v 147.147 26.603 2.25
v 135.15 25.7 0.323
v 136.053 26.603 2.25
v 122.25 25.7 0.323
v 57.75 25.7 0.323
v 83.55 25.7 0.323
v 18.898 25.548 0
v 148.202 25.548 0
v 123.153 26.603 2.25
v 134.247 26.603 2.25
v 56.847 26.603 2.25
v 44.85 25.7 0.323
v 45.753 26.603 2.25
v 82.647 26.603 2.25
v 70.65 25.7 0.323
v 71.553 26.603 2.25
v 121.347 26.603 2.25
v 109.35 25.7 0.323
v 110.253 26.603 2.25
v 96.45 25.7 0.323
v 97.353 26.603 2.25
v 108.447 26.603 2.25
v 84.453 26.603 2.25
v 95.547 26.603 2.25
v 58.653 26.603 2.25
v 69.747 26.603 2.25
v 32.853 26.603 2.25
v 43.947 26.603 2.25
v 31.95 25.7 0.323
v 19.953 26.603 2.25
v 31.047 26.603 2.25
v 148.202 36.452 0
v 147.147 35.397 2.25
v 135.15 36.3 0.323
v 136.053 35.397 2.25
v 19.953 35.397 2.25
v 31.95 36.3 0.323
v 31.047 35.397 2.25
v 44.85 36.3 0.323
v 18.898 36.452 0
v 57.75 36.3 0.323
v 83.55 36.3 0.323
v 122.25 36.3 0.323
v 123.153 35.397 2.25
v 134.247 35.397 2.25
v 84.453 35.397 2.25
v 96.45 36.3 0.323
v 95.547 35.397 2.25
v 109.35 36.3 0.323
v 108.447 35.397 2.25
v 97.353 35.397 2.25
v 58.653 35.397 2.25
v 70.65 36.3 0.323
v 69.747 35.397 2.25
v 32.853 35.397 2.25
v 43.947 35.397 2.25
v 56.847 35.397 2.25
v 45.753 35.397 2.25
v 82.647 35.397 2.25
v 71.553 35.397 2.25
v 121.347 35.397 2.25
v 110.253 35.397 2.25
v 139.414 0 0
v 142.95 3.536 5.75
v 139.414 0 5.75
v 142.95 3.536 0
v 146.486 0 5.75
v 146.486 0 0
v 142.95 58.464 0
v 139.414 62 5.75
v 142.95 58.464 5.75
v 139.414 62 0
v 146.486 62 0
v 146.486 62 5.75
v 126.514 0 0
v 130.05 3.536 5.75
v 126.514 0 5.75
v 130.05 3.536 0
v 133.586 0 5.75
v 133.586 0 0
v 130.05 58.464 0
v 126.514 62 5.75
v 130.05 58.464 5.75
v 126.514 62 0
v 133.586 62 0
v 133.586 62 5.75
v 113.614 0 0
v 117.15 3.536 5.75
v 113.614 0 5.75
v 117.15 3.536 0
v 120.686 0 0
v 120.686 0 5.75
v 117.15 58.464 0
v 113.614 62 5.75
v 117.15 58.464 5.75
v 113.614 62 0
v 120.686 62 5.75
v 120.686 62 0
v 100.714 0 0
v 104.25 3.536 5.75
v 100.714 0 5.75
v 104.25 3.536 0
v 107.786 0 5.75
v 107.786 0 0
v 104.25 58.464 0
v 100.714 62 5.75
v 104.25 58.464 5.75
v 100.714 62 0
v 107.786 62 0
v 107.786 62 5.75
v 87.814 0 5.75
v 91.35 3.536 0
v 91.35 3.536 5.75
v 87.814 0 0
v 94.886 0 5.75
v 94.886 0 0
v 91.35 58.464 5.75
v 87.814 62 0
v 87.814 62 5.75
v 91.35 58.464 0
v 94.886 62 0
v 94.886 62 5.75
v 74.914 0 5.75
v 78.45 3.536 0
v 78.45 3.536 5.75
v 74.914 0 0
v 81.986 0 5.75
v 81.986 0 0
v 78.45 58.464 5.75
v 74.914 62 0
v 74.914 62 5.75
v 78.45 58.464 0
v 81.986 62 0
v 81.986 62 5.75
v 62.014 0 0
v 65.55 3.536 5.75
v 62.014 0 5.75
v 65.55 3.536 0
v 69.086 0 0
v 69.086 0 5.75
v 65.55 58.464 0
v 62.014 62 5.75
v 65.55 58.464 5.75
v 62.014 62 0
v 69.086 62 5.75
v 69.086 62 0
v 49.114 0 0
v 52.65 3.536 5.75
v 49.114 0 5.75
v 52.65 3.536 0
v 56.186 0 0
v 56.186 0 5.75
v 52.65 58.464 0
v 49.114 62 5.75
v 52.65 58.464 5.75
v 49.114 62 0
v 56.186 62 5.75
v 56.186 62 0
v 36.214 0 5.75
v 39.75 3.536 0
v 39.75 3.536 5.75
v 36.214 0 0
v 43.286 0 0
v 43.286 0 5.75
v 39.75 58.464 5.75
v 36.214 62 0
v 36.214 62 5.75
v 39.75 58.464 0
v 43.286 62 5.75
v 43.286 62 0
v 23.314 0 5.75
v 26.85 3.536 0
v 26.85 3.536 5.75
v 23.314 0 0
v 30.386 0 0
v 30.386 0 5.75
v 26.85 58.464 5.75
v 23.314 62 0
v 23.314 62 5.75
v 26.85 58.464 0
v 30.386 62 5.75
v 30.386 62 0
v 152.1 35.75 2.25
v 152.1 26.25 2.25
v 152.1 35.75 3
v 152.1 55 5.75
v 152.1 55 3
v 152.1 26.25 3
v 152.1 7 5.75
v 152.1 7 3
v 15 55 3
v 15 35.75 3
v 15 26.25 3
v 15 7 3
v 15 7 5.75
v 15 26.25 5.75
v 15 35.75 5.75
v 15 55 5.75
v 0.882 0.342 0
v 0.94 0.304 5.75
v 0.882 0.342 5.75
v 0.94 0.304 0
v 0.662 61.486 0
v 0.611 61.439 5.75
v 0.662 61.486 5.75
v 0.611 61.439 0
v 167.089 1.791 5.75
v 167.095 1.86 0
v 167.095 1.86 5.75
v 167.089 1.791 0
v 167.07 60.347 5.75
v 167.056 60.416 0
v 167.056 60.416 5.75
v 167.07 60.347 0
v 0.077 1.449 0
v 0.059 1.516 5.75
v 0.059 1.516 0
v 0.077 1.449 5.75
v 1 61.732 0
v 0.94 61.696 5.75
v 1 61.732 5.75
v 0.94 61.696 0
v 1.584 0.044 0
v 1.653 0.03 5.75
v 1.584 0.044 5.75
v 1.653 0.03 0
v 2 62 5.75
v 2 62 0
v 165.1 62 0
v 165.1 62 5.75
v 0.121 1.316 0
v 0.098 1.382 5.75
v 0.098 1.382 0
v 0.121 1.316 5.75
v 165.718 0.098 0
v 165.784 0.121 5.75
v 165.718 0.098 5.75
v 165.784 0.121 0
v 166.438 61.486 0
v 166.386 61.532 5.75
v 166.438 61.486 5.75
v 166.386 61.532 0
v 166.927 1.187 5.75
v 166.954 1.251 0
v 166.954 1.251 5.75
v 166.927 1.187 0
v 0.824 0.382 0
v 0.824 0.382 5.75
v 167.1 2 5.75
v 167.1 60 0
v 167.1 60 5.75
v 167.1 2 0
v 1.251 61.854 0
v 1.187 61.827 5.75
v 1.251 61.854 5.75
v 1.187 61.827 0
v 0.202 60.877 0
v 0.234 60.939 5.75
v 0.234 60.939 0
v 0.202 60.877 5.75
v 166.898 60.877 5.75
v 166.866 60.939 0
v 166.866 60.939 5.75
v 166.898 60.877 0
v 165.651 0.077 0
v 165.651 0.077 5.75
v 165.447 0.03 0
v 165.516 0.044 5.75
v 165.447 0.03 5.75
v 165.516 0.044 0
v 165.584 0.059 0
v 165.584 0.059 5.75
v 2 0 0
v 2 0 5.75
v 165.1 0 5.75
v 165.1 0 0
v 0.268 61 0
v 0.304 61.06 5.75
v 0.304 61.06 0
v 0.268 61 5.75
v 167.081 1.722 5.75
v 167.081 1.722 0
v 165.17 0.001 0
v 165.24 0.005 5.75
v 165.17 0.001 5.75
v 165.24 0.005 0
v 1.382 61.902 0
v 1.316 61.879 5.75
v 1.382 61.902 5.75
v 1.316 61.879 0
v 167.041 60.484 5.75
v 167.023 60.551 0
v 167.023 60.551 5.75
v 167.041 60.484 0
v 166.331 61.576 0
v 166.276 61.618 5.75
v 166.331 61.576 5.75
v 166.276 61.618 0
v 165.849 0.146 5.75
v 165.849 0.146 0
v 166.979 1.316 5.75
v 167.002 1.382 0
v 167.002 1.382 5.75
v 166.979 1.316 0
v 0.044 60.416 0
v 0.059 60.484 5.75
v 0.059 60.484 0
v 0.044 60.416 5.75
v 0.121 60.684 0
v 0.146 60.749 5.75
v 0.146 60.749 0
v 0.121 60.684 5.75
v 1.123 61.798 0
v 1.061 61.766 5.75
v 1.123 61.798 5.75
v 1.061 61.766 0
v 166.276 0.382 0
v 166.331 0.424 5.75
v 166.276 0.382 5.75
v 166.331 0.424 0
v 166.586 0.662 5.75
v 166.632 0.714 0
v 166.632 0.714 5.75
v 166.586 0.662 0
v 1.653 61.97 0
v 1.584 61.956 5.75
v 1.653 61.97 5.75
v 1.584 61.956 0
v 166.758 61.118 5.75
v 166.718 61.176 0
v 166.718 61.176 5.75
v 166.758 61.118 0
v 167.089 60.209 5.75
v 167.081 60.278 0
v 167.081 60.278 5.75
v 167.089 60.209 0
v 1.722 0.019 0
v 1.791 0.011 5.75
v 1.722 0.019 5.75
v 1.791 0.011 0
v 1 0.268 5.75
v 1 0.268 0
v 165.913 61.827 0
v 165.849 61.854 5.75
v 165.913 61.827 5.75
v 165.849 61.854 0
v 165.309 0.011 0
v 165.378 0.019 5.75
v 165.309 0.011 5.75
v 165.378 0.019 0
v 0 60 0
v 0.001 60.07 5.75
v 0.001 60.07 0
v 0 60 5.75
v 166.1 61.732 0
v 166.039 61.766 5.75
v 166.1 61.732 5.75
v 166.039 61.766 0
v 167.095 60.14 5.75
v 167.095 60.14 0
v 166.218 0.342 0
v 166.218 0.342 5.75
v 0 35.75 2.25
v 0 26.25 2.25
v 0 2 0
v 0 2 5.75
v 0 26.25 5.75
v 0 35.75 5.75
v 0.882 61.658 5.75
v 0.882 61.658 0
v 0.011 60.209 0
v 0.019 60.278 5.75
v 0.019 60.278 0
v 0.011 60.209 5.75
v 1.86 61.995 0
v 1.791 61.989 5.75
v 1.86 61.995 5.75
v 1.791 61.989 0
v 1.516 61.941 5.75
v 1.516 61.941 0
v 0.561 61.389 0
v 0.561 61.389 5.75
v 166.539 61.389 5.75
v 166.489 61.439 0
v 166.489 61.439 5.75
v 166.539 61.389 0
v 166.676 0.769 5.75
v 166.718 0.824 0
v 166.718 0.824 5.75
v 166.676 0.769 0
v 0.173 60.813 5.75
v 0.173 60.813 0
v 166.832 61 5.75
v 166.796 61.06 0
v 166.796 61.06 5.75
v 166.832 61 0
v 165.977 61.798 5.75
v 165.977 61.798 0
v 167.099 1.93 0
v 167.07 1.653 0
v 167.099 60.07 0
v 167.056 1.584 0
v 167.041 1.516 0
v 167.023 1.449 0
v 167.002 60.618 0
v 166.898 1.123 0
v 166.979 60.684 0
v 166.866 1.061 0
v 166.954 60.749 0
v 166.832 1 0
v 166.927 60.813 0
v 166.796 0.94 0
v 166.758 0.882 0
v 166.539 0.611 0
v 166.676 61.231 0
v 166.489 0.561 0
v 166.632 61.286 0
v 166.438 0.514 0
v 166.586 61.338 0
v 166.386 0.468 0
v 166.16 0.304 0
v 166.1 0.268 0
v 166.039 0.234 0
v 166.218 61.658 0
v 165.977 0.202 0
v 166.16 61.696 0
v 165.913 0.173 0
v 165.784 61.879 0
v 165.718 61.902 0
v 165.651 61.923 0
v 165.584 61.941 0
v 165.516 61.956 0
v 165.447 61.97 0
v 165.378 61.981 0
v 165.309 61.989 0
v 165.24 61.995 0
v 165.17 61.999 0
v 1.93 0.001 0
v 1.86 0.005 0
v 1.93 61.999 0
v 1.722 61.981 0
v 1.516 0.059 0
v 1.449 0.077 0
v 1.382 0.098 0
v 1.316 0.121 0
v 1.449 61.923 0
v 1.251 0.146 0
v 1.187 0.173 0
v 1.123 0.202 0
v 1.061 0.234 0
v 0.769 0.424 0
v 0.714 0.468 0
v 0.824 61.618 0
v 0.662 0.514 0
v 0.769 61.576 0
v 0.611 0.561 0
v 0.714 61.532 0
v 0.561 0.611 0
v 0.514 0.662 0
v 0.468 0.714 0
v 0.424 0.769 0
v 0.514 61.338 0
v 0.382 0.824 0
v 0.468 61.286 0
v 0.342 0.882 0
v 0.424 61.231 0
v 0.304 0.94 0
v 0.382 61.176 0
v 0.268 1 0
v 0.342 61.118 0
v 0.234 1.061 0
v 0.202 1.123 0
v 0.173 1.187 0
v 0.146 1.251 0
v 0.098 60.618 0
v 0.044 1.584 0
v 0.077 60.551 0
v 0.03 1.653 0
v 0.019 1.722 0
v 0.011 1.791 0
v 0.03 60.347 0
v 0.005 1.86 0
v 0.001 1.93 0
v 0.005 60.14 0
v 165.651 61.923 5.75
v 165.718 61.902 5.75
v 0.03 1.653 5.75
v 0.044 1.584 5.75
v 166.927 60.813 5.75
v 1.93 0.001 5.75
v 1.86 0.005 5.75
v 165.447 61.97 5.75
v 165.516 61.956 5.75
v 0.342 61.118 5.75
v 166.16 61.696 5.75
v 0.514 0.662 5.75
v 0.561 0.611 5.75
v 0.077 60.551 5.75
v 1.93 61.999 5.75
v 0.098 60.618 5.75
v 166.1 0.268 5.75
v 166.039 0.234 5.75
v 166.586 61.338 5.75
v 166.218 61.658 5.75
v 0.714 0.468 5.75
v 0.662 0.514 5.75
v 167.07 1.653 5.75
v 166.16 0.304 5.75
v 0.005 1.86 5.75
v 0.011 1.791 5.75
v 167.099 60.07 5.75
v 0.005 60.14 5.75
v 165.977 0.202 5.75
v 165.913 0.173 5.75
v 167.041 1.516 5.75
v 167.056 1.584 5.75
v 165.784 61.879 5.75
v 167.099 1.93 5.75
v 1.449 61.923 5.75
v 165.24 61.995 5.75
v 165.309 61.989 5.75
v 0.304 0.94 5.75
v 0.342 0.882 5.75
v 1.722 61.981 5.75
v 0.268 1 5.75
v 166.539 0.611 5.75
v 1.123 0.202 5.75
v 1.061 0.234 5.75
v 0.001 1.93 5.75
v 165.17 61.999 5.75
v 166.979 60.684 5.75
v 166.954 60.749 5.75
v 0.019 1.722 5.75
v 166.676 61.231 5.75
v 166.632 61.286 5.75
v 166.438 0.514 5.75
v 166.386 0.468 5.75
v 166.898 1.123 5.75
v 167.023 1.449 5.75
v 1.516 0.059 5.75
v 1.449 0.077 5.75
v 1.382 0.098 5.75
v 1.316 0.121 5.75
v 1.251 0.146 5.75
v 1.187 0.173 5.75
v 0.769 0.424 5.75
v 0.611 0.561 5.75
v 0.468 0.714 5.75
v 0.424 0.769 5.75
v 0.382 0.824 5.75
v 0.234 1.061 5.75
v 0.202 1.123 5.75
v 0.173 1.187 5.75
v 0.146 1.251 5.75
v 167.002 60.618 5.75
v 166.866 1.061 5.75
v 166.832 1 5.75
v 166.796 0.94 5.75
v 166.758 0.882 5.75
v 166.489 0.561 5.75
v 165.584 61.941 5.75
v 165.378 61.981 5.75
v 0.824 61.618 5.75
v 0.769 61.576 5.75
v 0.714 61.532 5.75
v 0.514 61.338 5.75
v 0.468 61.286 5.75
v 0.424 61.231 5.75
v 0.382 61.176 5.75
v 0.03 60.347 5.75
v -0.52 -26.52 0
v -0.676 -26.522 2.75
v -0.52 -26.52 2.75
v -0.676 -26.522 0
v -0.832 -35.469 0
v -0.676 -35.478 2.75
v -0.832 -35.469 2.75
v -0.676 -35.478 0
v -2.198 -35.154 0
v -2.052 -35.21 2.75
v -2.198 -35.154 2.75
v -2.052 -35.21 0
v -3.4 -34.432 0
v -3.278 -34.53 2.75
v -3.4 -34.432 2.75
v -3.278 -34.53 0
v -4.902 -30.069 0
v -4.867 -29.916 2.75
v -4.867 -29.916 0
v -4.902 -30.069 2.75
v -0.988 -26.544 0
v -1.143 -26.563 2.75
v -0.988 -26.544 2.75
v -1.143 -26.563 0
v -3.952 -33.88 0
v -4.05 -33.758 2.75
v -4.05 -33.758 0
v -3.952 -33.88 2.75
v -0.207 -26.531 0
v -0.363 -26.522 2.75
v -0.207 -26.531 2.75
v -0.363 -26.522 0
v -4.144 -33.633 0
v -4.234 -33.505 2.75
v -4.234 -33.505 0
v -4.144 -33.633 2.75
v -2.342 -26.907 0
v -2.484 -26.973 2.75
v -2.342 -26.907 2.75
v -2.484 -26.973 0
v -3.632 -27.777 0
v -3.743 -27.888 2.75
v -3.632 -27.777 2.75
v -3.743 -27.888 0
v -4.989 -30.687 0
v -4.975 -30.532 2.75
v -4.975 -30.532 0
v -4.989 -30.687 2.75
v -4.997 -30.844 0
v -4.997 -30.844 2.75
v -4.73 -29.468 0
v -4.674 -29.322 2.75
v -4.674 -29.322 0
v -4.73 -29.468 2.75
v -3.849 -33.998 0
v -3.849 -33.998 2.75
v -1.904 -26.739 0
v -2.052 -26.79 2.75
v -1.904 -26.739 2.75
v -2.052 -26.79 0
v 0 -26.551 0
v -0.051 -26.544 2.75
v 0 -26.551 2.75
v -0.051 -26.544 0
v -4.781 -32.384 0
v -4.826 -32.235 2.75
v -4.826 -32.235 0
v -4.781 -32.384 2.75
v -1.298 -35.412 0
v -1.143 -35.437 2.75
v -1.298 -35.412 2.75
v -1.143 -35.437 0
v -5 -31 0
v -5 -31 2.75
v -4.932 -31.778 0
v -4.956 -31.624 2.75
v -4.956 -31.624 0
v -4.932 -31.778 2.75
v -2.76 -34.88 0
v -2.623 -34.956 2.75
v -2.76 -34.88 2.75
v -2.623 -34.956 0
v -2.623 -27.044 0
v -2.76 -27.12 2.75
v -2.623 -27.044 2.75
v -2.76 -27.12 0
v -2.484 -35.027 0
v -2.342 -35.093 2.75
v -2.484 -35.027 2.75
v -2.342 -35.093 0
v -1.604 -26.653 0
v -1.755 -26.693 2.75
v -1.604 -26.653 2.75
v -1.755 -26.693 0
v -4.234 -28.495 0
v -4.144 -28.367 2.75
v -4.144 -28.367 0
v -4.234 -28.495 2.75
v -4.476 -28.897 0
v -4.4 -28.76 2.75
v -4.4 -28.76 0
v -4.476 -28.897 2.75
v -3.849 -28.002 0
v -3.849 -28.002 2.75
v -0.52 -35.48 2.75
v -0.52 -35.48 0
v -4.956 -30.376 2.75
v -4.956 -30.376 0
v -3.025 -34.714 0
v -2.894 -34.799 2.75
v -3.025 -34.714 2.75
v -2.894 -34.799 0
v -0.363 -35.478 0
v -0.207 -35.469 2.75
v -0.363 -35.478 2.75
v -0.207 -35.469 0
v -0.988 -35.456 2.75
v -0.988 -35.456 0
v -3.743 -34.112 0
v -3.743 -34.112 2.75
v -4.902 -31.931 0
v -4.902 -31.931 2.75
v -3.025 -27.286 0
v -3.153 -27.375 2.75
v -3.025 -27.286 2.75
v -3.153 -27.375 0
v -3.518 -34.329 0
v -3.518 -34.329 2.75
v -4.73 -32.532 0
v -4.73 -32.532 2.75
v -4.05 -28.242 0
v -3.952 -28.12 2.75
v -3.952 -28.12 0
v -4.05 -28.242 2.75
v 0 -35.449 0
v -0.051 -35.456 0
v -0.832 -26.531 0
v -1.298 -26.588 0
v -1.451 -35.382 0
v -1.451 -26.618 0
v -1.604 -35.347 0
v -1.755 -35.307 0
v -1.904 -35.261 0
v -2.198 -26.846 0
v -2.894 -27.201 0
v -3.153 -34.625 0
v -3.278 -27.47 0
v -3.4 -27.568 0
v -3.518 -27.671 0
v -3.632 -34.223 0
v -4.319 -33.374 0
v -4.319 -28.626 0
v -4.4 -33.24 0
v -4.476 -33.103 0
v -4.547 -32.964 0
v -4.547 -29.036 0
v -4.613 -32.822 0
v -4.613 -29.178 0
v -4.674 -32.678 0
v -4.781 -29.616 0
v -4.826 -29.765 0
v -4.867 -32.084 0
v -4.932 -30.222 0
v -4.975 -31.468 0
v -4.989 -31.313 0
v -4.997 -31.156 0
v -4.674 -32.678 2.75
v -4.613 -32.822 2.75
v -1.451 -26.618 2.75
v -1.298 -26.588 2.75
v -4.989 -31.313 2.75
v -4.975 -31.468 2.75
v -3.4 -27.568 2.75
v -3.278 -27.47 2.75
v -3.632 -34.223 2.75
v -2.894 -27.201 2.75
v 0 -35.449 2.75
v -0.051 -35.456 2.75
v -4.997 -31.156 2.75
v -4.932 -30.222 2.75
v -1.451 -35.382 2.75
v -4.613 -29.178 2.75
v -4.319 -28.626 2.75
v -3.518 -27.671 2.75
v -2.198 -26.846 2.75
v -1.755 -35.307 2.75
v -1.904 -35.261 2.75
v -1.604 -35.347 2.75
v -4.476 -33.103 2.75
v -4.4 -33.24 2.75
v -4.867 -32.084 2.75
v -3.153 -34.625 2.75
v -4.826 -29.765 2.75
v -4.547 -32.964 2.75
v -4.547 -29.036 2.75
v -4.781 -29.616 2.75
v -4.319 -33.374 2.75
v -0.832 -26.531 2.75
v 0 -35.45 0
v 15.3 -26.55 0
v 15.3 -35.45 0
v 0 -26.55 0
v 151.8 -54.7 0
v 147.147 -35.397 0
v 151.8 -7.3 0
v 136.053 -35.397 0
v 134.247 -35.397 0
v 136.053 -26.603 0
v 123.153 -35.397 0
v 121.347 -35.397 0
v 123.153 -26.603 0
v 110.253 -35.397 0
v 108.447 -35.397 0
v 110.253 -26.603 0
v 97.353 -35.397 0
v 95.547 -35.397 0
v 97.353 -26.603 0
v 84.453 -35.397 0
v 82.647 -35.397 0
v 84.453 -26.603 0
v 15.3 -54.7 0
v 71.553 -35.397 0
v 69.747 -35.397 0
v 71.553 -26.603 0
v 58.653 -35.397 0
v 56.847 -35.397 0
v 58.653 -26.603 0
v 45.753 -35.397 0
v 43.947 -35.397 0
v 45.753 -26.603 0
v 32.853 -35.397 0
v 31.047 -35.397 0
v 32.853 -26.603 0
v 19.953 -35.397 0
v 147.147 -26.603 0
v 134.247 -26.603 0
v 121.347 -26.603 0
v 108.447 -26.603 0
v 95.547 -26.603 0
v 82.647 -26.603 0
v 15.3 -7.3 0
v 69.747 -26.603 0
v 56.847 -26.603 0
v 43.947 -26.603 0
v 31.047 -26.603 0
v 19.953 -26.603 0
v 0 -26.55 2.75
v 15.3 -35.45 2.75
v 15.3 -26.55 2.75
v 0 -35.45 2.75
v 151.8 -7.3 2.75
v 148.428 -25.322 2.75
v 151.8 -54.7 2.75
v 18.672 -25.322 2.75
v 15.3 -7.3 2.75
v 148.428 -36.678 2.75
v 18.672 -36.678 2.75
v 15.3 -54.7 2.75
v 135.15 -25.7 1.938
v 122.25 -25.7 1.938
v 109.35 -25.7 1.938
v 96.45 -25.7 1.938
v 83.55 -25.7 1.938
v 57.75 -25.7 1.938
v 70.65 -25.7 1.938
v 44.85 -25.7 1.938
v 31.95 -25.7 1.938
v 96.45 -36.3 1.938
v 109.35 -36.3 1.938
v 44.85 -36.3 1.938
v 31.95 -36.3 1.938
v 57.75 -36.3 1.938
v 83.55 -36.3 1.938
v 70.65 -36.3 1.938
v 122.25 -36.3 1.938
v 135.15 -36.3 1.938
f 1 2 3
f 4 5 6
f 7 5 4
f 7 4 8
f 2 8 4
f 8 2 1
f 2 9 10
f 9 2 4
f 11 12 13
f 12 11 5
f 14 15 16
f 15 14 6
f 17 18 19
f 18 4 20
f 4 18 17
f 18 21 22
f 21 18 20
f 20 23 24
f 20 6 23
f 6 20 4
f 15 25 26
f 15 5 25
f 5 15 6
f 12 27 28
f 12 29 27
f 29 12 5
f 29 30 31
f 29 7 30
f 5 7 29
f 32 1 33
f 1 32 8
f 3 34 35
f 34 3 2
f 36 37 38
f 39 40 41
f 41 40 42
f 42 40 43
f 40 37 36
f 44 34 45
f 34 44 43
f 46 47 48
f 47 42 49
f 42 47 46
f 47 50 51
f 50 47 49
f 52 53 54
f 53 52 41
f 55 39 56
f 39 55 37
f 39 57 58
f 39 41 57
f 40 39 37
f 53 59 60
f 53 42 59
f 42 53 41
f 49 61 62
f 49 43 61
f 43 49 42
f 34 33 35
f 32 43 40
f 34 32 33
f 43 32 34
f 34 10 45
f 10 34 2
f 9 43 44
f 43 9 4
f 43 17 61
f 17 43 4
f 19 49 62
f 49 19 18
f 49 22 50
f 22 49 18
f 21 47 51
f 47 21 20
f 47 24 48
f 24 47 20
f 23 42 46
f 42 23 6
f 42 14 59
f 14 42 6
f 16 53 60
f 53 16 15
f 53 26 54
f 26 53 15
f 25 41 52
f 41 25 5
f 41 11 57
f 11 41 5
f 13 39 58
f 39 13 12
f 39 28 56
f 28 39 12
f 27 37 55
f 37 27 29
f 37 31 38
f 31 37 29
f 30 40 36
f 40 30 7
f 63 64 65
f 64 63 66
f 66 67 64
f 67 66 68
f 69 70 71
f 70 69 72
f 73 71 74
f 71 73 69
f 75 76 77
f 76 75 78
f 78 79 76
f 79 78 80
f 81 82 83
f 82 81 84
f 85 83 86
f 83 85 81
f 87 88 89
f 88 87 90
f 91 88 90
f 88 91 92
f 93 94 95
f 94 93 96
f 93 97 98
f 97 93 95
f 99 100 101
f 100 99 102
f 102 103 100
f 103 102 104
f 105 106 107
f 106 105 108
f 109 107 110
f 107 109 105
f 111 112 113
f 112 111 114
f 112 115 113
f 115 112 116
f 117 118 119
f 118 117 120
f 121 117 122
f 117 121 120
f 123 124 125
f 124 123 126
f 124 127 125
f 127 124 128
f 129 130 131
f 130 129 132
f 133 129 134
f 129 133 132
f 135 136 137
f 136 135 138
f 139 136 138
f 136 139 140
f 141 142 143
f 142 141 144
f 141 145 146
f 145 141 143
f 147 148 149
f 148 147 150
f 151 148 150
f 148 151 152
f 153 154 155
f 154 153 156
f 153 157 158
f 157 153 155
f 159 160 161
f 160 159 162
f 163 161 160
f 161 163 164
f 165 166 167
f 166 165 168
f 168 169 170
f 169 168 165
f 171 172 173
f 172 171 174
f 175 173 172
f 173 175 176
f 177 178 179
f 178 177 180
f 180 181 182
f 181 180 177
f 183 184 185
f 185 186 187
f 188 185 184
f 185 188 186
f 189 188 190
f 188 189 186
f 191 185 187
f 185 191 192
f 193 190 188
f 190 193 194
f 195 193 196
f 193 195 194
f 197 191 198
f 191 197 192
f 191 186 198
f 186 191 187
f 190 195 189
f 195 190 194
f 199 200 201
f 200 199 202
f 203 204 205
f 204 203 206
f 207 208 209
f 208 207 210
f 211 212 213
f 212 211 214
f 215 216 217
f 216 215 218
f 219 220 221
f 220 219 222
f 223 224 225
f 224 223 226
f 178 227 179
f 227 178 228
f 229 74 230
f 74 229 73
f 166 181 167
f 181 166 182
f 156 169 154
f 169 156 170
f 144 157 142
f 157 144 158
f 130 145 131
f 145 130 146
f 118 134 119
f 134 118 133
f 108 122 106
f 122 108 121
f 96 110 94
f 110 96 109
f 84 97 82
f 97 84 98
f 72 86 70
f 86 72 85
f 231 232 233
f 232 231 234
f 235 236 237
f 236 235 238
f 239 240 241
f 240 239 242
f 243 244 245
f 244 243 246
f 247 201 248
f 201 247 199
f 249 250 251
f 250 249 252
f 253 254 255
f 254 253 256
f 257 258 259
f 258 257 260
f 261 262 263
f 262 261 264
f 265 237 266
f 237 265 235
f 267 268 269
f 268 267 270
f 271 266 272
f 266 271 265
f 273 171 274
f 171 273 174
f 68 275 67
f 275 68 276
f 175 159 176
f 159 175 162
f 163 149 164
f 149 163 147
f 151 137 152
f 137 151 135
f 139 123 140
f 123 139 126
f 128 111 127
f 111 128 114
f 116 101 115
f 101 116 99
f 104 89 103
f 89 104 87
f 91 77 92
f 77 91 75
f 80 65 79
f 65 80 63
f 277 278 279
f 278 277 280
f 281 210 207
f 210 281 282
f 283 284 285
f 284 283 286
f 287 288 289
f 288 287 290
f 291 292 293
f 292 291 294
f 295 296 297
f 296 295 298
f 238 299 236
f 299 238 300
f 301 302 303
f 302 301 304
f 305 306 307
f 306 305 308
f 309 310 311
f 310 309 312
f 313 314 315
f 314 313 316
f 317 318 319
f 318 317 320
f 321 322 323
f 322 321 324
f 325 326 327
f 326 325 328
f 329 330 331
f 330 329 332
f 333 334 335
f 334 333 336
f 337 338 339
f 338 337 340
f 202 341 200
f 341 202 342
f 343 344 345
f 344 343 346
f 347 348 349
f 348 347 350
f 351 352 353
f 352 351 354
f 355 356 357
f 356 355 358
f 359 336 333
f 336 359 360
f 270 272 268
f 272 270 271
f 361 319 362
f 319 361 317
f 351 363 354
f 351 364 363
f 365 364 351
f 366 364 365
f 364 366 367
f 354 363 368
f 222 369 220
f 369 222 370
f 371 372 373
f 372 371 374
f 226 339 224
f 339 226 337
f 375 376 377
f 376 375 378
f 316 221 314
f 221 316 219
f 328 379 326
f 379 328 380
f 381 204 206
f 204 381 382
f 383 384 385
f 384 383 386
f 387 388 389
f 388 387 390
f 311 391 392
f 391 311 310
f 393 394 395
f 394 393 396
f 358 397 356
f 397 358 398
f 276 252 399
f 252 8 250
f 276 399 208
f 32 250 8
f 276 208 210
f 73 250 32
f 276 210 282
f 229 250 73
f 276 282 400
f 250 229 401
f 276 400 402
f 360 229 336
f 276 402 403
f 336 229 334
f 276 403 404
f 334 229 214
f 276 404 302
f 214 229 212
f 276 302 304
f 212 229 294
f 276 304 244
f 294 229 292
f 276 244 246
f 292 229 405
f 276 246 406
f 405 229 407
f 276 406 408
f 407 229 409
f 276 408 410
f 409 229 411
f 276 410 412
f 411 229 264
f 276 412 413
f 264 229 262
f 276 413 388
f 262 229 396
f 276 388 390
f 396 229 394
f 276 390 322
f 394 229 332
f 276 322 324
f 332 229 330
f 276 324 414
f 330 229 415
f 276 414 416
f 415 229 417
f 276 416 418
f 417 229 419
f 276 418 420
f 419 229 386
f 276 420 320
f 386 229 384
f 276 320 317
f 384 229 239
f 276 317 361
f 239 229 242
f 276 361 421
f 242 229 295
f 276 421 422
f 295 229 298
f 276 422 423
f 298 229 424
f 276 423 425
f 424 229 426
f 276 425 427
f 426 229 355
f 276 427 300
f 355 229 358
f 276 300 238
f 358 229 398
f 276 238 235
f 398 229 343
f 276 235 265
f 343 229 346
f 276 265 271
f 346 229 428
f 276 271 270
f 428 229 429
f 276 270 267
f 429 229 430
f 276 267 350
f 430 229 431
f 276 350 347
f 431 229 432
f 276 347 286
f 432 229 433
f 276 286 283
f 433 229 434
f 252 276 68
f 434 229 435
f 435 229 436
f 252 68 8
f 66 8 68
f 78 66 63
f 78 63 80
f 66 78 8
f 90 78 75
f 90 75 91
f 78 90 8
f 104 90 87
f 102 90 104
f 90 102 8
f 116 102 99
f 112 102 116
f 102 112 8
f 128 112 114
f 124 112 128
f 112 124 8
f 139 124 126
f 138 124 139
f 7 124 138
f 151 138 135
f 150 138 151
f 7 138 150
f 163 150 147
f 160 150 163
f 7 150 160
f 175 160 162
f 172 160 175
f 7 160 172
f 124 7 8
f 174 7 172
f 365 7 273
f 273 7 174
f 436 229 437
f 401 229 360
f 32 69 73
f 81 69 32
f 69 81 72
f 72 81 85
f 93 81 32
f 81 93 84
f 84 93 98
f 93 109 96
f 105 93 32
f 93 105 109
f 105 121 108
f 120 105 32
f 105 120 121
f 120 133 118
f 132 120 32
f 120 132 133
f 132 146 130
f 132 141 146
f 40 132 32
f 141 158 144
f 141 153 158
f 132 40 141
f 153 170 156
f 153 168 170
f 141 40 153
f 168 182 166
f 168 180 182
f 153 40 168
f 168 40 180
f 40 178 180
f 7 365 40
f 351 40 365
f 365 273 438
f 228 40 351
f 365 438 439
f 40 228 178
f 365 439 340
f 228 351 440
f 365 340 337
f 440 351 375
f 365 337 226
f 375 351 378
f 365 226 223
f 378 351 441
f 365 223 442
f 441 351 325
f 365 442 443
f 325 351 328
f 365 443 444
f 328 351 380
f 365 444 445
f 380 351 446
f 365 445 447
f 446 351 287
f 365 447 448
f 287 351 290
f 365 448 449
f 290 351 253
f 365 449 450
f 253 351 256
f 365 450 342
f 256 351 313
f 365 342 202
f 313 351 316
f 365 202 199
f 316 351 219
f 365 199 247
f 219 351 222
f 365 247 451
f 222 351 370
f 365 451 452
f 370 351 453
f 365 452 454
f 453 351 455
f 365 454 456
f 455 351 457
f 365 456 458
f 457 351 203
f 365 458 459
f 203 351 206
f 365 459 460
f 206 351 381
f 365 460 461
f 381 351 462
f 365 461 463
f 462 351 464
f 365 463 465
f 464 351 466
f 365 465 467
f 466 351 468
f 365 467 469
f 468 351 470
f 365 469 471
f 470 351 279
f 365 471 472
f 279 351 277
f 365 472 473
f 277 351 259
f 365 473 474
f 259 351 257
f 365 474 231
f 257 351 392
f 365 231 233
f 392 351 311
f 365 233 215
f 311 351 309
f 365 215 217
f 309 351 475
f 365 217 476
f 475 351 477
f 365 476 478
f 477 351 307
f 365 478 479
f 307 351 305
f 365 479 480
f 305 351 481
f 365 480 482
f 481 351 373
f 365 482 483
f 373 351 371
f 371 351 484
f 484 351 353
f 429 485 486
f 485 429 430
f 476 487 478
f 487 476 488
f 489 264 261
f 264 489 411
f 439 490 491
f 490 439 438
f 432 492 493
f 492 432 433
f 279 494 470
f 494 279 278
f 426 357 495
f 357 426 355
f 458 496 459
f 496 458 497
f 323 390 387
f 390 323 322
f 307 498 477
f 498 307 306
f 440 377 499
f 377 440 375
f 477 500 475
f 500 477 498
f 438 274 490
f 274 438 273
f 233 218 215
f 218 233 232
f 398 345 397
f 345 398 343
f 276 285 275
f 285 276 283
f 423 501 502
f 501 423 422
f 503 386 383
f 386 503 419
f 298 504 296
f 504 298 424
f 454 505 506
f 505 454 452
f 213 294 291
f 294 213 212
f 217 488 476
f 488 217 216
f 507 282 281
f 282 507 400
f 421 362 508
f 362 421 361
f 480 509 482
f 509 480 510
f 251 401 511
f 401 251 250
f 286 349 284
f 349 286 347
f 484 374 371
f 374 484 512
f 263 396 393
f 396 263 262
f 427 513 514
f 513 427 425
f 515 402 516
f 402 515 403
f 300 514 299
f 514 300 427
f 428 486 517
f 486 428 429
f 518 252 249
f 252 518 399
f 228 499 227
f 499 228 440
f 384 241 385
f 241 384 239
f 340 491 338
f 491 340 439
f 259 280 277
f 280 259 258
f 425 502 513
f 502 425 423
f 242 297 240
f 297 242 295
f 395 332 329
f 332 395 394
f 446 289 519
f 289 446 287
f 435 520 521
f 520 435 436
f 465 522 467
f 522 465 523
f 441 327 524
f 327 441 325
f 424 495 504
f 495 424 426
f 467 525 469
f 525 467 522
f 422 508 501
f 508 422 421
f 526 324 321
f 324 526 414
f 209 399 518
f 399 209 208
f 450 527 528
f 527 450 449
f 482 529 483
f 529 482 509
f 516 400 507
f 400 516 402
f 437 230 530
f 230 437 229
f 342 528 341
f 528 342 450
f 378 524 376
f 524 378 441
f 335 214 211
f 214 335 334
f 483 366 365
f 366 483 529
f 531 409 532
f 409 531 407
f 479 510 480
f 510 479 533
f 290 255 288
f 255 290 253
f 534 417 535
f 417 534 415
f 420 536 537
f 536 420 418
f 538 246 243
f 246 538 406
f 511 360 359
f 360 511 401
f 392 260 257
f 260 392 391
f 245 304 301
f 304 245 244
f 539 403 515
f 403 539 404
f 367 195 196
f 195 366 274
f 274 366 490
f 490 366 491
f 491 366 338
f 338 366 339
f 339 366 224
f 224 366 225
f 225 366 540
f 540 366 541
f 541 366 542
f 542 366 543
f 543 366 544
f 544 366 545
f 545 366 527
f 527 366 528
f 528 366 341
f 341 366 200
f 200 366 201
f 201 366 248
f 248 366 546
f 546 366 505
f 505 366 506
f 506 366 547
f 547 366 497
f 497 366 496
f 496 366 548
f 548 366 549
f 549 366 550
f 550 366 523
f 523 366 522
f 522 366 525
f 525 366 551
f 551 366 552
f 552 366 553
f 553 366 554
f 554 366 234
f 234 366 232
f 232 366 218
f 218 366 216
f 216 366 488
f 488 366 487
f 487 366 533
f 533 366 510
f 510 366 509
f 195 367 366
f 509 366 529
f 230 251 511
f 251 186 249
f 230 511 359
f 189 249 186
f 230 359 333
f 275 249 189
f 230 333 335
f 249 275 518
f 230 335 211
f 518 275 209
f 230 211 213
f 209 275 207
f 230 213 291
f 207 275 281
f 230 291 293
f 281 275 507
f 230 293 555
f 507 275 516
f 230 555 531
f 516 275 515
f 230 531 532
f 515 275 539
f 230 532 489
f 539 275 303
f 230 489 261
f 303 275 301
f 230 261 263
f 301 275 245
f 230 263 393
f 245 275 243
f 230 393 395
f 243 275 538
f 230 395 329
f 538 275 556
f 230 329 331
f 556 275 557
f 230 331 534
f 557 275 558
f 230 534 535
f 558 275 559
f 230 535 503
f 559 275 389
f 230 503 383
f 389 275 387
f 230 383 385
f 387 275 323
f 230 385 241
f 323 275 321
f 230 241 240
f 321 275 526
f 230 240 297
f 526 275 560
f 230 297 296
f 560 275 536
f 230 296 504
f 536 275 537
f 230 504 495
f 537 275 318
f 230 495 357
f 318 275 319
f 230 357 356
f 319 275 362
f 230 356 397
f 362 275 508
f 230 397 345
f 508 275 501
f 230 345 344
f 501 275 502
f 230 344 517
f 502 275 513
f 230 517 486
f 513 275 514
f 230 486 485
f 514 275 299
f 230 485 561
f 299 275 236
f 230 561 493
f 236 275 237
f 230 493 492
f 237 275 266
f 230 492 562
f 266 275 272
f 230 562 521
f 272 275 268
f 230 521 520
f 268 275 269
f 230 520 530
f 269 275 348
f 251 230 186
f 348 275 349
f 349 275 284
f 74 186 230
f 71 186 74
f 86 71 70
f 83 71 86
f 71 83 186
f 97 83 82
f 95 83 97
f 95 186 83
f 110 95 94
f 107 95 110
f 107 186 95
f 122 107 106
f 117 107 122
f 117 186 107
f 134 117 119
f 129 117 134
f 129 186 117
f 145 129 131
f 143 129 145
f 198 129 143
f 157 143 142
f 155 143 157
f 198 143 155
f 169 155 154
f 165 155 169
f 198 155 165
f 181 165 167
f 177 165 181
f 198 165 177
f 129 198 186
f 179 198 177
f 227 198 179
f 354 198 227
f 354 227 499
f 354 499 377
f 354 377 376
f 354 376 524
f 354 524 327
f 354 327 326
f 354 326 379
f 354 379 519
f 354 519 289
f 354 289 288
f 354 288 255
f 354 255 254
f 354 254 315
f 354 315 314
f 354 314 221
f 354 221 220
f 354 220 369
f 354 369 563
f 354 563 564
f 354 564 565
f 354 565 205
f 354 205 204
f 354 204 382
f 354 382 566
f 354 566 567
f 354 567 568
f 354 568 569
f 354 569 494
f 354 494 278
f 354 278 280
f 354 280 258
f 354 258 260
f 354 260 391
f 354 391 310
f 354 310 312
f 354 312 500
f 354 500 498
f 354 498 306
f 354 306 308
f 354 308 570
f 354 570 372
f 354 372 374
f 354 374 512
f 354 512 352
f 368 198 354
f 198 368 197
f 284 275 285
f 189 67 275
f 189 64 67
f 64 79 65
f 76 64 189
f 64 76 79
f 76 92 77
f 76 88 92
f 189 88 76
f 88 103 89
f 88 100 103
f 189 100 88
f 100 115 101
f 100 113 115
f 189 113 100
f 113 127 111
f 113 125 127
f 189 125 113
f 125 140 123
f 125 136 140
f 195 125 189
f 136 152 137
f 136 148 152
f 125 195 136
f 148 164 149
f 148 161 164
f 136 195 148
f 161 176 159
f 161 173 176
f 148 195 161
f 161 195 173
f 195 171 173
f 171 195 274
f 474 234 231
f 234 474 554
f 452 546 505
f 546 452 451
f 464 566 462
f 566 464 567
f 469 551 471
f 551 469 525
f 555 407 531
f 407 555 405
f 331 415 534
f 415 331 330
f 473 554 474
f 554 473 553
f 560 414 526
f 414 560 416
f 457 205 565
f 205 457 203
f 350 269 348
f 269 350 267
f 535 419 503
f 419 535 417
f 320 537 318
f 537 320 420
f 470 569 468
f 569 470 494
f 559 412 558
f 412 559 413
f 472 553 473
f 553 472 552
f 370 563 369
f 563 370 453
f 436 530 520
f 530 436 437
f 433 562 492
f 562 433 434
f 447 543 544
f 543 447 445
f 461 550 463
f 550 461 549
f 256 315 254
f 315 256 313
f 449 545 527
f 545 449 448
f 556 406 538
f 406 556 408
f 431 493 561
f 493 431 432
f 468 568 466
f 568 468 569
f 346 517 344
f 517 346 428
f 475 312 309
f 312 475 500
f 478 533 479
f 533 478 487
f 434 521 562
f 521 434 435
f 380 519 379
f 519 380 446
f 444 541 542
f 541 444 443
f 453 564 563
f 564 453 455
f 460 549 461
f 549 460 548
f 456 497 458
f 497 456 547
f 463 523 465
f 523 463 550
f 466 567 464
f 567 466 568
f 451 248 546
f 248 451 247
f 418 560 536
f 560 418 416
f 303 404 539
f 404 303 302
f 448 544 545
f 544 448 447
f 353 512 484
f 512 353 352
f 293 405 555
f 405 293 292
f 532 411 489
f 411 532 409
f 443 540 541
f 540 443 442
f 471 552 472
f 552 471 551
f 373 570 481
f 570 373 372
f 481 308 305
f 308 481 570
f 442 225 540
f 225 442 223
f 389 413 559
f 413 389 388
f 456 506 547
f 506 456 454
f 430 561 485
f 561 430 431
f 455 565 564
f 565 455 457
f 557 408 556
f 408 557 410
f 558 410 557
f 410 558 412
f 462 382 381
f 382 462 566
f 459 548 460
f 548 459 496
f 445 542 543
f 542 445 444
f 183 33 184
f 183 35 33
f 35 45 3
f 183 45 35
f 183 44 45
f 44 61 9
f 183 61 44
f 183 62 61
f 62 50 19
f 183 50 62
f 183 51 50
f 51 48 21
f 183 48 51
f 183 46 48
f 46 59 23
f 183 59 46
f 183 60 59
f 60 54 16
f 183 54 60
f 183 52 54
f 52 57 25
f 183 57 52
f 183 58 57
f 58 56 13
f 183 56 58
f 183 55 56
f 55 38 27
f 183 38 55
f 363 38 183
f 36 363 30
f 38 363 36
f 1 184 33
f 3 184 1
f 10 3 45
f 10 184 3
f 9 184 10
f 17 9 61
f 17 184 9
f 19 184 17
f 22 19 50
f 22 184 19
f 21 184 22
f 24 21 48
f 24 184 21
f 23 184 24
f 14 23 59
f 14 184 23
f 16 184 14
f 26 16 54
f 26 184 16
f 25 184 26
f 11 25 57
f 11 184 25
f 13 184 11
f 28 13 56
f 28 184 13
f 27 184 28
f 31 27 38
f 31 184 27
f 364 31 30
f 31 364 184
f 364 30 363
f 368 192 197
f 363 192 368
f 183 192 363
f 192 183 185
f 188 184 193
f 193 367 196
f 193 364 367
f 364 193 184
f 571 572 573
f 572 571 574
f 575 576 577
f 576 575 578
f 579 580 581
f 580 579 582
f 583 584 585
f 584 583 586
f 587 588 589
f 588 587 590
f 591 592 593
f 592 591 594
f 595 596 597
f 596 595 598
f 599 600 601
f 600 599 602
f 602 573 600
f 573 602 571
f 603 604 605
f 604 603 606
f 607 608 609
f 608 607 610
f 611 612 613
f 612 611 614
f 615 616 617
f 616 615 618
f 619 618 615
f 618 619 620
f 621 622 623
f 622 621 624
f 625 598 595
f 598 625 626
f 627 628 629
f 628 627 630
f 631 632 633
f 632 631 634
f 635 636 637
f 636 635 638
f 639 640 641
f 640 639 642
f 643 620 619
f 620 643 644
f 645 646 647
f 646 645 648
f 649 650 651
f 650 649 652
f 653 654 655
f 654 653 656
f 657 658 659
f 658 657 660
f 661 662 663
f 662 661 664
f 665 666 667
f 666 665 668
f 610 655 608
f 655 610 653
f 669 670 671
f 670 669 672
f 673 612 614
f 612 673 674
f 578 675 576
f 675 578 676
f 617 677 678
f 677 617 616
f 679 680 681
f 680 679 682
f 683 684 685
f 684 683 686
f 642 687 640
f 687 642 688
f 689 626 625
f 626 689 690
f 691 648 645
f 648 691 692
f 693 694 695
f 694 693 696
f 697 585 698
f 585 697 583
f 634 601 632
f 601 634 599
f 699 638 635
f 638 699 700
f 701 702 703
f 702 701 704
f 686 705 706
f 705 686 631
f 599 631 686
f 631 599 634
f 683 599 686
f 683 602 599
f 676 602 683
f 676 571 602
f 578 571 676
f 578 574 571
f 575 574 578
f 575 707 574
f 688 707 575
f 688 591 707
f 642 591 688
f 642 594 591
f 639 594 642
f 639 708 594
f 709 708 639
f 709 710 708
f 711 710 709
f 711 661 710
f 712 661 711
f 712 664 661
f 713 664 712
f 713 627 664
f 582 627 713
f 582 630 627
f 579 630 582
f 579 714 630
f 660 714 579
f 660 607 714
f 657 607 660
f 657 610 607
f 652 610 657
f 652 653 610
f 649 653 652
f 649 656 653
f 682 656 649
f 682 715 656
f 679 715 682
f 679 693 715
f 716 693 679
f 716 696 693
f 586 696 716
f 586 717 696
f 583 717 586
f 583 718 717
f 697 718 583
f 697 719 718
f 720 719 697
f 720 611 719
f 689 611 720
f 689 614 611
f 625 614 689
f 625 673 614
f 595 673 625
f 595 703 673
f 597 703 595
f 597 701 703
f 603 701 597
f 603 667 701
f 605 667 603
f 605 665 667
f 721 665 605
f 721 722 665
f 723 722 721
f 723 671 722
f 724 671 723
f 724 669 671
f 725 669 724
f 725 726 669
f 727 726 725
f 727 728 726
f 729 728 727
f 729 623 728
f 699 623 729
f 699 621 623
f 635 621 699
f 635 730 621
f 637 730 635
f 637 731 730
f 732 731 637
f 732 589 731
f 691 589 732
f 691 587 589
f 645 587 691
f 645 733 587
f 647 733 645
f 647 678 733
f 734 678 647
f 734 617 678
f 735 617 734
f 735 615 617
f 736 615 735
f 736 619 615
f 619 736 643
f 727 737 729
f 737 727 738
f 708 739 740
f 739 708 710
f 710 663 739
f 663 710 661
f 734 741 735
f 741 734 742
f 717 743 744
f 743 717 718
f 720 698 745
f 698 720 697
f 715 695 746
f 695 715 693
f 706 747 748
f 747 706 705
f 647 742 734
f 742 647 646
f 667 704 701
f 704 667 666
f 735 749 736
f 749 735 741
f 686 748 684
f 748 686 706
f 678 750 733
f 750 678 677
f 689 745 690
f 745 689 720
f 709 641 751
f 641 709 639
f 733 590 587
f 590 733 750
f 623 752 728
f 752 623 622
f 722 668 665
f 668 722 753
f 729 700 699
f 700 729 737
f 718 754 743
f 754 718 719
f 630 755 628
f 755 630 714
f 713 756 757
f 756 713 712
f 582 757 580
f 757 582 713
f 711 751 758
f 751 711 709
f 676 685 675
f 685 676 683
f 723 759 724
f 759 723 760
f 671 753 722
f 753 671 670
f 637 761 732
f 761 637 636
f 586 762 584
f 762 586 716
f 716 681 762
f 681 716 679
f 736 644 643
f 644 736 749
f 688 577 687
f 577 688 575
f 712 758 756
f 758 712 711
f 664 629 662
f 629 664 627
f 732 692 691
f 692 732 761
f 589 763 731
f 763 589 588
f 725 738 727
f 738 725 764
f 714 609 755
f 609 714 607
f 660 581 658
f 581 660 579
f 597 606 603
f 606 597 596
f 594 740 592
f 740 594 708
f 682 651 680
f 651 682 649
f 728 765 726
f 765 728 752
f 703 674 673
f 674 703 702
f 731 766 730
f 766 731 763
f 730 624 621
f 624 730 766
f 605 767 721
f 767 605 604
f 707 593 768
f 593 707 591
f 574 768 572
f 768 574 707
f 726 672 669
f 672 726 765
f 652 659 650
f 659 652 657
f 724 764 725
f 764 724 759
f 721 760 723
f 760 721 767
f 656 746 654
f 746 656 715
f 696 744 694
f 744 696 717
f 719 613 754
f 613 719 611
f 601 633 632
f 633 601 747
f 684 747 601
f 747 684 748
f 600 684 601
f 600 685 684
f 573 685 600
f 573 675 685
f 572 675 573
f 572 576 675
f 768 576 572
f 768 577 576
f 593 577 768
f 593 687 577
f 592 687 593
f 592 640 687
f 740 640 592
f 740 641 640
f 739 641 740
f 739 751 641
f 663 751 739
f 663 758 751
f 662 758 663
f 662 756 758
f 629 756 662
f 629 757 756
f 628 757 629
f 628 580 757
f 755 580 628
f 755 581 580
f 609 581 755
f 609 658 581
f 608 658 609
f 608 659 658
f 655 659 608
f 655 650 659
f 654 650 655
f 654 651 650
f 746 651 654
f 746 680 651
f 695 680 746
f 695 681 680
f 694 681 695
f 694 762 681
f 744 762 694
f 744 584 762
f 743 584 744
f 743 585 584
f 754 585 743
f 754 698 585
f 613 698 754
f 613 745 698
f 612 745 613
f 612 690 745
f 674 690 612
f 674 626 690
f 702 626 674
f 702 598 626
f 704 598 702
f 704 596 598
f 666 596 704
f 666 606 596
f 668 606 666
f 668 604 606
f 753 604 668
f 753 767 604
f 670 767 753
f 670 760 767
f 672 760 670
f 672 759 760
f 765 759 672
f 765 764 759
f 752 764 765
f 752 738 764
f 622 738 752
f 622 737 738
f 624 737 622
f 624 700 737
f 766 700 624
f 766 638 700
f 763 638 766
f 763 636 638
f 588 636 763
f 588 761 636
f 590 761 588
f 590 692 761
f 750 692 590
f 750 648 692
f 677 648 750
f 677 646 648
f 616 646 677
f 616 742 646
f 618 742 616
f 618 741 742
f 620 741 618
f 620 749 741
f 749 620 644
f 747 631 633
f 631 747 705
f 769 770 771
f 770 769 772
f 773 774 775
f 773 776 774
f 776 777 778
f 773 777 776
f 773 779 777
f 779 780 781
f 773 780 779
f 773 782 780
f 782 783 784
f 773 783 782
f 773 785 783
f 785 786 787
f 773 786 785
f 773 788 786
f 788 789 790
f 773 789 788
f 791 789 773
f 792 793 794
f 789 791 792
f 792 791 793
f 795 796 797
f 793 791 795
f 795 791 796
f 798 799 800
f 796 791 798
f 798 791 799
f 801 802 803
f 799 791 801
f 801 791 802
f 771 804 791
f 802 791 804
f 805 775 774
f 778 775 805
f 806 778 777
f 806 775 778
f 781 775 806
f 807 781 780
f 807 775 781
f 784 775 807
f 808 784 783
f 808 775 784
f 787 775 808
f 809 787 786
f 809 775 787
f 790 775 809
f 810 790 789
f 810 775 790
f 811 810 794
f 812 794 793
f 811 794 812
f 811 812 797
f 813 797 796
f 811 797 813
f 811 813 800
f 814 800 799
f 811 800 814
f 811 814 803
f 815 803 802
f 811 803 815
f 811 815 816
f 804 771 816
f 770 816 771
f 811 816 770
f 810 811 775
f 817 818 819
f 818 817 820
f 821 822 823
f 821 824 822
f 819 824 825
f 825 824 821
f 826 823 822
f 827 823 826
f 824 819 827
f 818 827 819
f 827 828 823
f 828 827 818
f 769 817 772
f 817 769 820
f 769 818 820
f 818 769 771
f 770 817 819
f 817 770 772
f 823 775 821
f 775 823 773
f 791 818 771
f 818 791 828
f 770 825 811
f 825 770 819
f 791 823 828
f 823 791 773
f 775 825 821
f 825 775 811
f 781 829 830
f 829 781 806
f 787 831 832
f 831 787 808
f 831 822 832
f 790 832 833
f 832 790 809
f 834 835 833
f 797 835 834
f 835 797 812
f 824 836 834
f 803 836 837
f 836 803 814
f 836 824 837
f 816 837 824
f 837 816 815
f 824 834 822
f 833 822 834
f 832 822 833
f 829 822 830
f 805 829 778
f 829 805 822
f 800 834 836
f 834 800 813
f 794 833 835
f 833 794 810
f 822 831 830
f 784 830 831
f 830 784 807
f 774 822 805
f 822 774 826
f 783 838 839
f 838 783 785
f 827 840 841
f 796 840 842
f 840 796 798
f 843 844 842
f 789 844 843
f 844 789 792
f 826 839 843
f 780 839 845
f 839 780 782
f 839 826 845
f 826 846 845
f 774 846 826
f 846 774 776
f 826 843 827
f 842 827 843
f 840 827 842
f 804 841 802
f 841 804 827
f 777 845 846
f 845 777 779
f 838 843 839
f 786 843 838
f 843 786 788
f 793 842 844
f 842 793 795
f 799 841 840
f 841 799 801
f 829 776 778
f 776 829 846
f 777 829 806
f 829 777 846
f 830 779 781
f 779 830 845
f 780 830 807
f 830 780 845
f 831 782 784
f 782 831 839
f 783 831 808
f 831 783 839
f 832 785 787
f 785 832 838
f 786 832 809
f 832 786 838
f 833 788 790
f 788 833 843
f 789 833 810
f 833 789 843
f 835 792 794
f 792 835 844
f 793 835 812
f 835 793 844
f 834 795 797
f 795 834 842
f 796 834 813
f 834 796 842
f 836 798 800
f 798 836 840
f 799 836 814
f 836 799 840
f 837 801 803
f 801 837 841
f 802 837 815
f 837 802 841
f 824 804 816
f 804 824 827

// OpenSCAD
/*
 * Film Holder for Plustek OpticFilm scanners and 110 films.
 *
 * (C) 2016 Richard "Shred" Körber
 *
 * Project page on Thingiverse:
 *   https://www.thingiverse.com/thing:1328672
 *
 * Licensed under Creative Commons BY-NC-SA:
 *   https://creativecommons.org/licenses/by-nc-sa/3.0/
 */


// Also depends on your printer size!
numberOfWindows =10;    // [1:20]

// Use struts to save some material?
saveMaterial = "false"; // [false:No, true:Yes]


// trick the customizer into ignoring the following variables...
module endOfParameters() {}



height = 5.75;          // Total height (Z)
innerHeight = 3;        // Height of inner frame (Z)
minkRadius = 2;         // Minkowski radius for outer frame

totalWidth = 62;        // Total width (Y)
filmWidth = 9.5;         // Film width (Y)
filmThickness = 0.75;   // Film thickness (Z)

windowLength = 11;      // Length of a single window (X)
windowOffset = 5;       // Offset of first window to right frame edge (X)
windowDistance = 12.9;  // Distance between windows (X)
windowGap = 0.4;        // Gap size on each side (Y)

notchSize = 5;          // Length (X) of transport notches (depth is half of it)
notchHeight = height;   // Height (Z) of notches

coverFrameSizeX = 15;   // Distance outer edge to cover edge (X)
coverFrameSizeY = 7;    // Distance outer edge to cover edge (Y)
coverGap = 0.3;         // Gap between outer and inner edges

strutsThickness = 4;    // Thickness of the save material struts

cutHeight = height + 2;
windowCount = numberOfWindows;
windowWidth = filmWidth - 2 * windowGap;
filmLength = windowCount * windowDistance - (windowDistance - windowLength) + 2 * windowOffset;
totalLength = filmLength + 2 * coverFrameSizeX;
coverHeight = height - innerHeight;



// Holder Base
module holder() {
    translate([minkRadius, minkRadius, 0]) {
        minkowski() {
            cube([totalLength - minkRadius * 2, totalWidth- minkRadius * 2, height - 1]);
            cylinder(r=minkRadius, h=1);
        }
    }
}

// Cover Cutout
module coverCutout() {
    translate([0, coverFrameSizeY, innerHeight])
        cube([filmLength, totalWidth - coverFrameSizeY * 2, cutHeight]);
}

// Triangles (for the struts)
module triangle(dim) {
    polyhedron(
        points = [
            [0, 0, 0],
            [dim[0], 0, 0],
            [dim[0], dim[1], 0],
            [0, 0, dim[2]],
            [dim[0], 0, dim[2]],
            [dim[0], dim[1], dim[2]]
        ],
        faces = [
            [0, 1, 2], [3, 5, 4],
            [0, 3, 4, 1], [1, 4, 5, 2], [0, 2, 5, 3]

        ]
    );
}

// Circlular segment
module circlePart(dim) {
    r = (4 * pow(dim[0], 2) + pow(dim[1], 2)) / (8 * dim[0]);
    translate([r - dim[0], dim[1] / 2, dim[2] / 2]) {
        difference() {
            cylinder(h=dim[2], r=r, center=true);
            translate([dim[0], 0, -0.2]) cube([r*2, r*2, dim[2] + 0.5], center=true);
        }
    }
}

// Draws a single scan window
module window(wHeight) {
    chh = wHeight / 2;
    ihh = wHeight + 0.2;
    polyhedron(
        points = [
            [-chh, -chh, 0],
            [windowLength + chh, -chh, 0],
            [windowLength + chh, windowWidth + chh, 0],
            [-chh, windowWidth + chh, 0],
            [0, 0, ihh],
            [windowLength, 0, ihh],
            [windowLength, windowWidth, ihh],
            [0, windowWidth, ihh]
        ],
        faces = [
            [0, 4, 5, 1], [1, 5, 6, 2], [2, 6, 7, 3],
            [3, 7, 4, 0], [0, 1, 2, 3], [4, 7, 6, 5]
        ]
    );
}

// Draws all the windows
module windows(wHeight) {
    for (i = [filmLength - windowLength - windowOffset : -windowDistance : 0]) {
        translate([i, 0, -0.1]) window(wHeight);
    }
}

// Draws a single notch
module notch() {
    rotate([0, 0, 45]) translate([0, 0, (notchHeight / 2) - 0.1])
        cube([notchSize, notchSize, notchHeight + 0.3], center=true);
}

// Draws all the notches
module notches() {
    for (i = [filmLength - windowLength - windowOffset : -windowDistance : 0]) {
        translate([i + (windowWidth + windowOffset) / 2, 0, 0]) notch();
        translate([i + (windowWidth + windowOffset) / 2, totalWidth, 0]) notch();
    }
}

// Draws a cutout pattern to save material
module cutoutPattern(dim) {
    tw = dim[0] / 4;
    to = strutsThickness / 2;
    for (j = [0 : tw : dim[0] - 1]) {
        translate([j + to, 0, 0]) {
            triangle([tw - to * 1.5, dim[1] - to, dim[2]]);
        }
        translate([j + tw - to, dim[1], 0]) rotate([0, 0, 180]) {
            triangle([tw - to * 1.5, dim[1] - to, dim[2]]);
        }
    }
}

// If saving material, draws a cutout pattern above and below the windows
module saveMaterialCutout(length, border = 0) {
    if (saveMaterial == "true") {
        smHeight = (totalWidth - coverFrameSizeY * 2 - filmWidth) / 2 - strutsThickness;

        translate([0, totalWidth - coverFrameSizeY - smHeight, -0.1]) {
            cutoutPattern([length, smHeight - border, cutHeight]);
        }
        translate([0, coverFrameSizeY + border, -0.1]) {
            cutoutPattern([length, smHeight - border, cutHeight]);
        }
    }
}

// Draws the cover plate (without cutouts)
module coverPlate() {
    union() {
        translate([(totalLength - filmLength) / 2 + coverGap, 0, 0]) {
            cube([
                filmLength - coverGap * 2,
                totalWidth - coverFrameSizeY * 2 - coverGap * 2,
                coverHeight
            ]);
        }

        translate([
            0,
            (totalWidth - filmWidth - coverFrameSizeY * 2) / 2,
            0
        ]) {
            cube([
                coverFrameSizeX + coverGap * 4,
                filmWidth - coverGap * 2,
            coverHeight
            ]);
            circlePart([5, filmWidth - coverGap * 2, coverHeight]);
        }
    }

}

// Draws the entire holder bottom
module completeHolder() {
    difference() {
        holder();

        translate([-0.1, (totalWidth - filmWidth) / 2, innerHeight - filmThickness]) {
            cube([filmLength + coverFrameSizeX + 0.1, filmWidth, height]);
        }

        translate([
            (totalLength - filmLength) / 2,
            (totalWidth - filmWidth) / 2 + windowGap,
            -filmThickness])
        {
            windows(innerHeight);
        }

        translate([(totalLength - filmLength) / 2, 0, 0]) {
            coverCutout();
            notches();
            saveMaterialCutout(filmLength);
        }
    }
}

// Draws the entire holder top cover
module completeCover() {
    difference() {
        translate([0, coverFrameSizeY + coverGap, 0]) {
            coverPlate();
        }
        
        translate([
            (totalLength - filmLength) / 2,
            (totalWidth - filmWidth) / 2 + windowGap,
            0])
        {
            windows(coverHeight);
        }

        translate([(totalLength - filmLength) / 2 + strutsThickness, 0, 0]) {
            saveMaterialCutout(filmLength - strutsThickness * 2, strutsThickness);
        }
    }
}





completeHolder();

translate([0, 0, coverHeight]) rotate([180, 0, 0]) completeCover();

// uncomment to find out if the top cover fits into the holder
// translate([0, 0, height]) mirror([0, 0, 1]) completeCover();



$fn = 180;
